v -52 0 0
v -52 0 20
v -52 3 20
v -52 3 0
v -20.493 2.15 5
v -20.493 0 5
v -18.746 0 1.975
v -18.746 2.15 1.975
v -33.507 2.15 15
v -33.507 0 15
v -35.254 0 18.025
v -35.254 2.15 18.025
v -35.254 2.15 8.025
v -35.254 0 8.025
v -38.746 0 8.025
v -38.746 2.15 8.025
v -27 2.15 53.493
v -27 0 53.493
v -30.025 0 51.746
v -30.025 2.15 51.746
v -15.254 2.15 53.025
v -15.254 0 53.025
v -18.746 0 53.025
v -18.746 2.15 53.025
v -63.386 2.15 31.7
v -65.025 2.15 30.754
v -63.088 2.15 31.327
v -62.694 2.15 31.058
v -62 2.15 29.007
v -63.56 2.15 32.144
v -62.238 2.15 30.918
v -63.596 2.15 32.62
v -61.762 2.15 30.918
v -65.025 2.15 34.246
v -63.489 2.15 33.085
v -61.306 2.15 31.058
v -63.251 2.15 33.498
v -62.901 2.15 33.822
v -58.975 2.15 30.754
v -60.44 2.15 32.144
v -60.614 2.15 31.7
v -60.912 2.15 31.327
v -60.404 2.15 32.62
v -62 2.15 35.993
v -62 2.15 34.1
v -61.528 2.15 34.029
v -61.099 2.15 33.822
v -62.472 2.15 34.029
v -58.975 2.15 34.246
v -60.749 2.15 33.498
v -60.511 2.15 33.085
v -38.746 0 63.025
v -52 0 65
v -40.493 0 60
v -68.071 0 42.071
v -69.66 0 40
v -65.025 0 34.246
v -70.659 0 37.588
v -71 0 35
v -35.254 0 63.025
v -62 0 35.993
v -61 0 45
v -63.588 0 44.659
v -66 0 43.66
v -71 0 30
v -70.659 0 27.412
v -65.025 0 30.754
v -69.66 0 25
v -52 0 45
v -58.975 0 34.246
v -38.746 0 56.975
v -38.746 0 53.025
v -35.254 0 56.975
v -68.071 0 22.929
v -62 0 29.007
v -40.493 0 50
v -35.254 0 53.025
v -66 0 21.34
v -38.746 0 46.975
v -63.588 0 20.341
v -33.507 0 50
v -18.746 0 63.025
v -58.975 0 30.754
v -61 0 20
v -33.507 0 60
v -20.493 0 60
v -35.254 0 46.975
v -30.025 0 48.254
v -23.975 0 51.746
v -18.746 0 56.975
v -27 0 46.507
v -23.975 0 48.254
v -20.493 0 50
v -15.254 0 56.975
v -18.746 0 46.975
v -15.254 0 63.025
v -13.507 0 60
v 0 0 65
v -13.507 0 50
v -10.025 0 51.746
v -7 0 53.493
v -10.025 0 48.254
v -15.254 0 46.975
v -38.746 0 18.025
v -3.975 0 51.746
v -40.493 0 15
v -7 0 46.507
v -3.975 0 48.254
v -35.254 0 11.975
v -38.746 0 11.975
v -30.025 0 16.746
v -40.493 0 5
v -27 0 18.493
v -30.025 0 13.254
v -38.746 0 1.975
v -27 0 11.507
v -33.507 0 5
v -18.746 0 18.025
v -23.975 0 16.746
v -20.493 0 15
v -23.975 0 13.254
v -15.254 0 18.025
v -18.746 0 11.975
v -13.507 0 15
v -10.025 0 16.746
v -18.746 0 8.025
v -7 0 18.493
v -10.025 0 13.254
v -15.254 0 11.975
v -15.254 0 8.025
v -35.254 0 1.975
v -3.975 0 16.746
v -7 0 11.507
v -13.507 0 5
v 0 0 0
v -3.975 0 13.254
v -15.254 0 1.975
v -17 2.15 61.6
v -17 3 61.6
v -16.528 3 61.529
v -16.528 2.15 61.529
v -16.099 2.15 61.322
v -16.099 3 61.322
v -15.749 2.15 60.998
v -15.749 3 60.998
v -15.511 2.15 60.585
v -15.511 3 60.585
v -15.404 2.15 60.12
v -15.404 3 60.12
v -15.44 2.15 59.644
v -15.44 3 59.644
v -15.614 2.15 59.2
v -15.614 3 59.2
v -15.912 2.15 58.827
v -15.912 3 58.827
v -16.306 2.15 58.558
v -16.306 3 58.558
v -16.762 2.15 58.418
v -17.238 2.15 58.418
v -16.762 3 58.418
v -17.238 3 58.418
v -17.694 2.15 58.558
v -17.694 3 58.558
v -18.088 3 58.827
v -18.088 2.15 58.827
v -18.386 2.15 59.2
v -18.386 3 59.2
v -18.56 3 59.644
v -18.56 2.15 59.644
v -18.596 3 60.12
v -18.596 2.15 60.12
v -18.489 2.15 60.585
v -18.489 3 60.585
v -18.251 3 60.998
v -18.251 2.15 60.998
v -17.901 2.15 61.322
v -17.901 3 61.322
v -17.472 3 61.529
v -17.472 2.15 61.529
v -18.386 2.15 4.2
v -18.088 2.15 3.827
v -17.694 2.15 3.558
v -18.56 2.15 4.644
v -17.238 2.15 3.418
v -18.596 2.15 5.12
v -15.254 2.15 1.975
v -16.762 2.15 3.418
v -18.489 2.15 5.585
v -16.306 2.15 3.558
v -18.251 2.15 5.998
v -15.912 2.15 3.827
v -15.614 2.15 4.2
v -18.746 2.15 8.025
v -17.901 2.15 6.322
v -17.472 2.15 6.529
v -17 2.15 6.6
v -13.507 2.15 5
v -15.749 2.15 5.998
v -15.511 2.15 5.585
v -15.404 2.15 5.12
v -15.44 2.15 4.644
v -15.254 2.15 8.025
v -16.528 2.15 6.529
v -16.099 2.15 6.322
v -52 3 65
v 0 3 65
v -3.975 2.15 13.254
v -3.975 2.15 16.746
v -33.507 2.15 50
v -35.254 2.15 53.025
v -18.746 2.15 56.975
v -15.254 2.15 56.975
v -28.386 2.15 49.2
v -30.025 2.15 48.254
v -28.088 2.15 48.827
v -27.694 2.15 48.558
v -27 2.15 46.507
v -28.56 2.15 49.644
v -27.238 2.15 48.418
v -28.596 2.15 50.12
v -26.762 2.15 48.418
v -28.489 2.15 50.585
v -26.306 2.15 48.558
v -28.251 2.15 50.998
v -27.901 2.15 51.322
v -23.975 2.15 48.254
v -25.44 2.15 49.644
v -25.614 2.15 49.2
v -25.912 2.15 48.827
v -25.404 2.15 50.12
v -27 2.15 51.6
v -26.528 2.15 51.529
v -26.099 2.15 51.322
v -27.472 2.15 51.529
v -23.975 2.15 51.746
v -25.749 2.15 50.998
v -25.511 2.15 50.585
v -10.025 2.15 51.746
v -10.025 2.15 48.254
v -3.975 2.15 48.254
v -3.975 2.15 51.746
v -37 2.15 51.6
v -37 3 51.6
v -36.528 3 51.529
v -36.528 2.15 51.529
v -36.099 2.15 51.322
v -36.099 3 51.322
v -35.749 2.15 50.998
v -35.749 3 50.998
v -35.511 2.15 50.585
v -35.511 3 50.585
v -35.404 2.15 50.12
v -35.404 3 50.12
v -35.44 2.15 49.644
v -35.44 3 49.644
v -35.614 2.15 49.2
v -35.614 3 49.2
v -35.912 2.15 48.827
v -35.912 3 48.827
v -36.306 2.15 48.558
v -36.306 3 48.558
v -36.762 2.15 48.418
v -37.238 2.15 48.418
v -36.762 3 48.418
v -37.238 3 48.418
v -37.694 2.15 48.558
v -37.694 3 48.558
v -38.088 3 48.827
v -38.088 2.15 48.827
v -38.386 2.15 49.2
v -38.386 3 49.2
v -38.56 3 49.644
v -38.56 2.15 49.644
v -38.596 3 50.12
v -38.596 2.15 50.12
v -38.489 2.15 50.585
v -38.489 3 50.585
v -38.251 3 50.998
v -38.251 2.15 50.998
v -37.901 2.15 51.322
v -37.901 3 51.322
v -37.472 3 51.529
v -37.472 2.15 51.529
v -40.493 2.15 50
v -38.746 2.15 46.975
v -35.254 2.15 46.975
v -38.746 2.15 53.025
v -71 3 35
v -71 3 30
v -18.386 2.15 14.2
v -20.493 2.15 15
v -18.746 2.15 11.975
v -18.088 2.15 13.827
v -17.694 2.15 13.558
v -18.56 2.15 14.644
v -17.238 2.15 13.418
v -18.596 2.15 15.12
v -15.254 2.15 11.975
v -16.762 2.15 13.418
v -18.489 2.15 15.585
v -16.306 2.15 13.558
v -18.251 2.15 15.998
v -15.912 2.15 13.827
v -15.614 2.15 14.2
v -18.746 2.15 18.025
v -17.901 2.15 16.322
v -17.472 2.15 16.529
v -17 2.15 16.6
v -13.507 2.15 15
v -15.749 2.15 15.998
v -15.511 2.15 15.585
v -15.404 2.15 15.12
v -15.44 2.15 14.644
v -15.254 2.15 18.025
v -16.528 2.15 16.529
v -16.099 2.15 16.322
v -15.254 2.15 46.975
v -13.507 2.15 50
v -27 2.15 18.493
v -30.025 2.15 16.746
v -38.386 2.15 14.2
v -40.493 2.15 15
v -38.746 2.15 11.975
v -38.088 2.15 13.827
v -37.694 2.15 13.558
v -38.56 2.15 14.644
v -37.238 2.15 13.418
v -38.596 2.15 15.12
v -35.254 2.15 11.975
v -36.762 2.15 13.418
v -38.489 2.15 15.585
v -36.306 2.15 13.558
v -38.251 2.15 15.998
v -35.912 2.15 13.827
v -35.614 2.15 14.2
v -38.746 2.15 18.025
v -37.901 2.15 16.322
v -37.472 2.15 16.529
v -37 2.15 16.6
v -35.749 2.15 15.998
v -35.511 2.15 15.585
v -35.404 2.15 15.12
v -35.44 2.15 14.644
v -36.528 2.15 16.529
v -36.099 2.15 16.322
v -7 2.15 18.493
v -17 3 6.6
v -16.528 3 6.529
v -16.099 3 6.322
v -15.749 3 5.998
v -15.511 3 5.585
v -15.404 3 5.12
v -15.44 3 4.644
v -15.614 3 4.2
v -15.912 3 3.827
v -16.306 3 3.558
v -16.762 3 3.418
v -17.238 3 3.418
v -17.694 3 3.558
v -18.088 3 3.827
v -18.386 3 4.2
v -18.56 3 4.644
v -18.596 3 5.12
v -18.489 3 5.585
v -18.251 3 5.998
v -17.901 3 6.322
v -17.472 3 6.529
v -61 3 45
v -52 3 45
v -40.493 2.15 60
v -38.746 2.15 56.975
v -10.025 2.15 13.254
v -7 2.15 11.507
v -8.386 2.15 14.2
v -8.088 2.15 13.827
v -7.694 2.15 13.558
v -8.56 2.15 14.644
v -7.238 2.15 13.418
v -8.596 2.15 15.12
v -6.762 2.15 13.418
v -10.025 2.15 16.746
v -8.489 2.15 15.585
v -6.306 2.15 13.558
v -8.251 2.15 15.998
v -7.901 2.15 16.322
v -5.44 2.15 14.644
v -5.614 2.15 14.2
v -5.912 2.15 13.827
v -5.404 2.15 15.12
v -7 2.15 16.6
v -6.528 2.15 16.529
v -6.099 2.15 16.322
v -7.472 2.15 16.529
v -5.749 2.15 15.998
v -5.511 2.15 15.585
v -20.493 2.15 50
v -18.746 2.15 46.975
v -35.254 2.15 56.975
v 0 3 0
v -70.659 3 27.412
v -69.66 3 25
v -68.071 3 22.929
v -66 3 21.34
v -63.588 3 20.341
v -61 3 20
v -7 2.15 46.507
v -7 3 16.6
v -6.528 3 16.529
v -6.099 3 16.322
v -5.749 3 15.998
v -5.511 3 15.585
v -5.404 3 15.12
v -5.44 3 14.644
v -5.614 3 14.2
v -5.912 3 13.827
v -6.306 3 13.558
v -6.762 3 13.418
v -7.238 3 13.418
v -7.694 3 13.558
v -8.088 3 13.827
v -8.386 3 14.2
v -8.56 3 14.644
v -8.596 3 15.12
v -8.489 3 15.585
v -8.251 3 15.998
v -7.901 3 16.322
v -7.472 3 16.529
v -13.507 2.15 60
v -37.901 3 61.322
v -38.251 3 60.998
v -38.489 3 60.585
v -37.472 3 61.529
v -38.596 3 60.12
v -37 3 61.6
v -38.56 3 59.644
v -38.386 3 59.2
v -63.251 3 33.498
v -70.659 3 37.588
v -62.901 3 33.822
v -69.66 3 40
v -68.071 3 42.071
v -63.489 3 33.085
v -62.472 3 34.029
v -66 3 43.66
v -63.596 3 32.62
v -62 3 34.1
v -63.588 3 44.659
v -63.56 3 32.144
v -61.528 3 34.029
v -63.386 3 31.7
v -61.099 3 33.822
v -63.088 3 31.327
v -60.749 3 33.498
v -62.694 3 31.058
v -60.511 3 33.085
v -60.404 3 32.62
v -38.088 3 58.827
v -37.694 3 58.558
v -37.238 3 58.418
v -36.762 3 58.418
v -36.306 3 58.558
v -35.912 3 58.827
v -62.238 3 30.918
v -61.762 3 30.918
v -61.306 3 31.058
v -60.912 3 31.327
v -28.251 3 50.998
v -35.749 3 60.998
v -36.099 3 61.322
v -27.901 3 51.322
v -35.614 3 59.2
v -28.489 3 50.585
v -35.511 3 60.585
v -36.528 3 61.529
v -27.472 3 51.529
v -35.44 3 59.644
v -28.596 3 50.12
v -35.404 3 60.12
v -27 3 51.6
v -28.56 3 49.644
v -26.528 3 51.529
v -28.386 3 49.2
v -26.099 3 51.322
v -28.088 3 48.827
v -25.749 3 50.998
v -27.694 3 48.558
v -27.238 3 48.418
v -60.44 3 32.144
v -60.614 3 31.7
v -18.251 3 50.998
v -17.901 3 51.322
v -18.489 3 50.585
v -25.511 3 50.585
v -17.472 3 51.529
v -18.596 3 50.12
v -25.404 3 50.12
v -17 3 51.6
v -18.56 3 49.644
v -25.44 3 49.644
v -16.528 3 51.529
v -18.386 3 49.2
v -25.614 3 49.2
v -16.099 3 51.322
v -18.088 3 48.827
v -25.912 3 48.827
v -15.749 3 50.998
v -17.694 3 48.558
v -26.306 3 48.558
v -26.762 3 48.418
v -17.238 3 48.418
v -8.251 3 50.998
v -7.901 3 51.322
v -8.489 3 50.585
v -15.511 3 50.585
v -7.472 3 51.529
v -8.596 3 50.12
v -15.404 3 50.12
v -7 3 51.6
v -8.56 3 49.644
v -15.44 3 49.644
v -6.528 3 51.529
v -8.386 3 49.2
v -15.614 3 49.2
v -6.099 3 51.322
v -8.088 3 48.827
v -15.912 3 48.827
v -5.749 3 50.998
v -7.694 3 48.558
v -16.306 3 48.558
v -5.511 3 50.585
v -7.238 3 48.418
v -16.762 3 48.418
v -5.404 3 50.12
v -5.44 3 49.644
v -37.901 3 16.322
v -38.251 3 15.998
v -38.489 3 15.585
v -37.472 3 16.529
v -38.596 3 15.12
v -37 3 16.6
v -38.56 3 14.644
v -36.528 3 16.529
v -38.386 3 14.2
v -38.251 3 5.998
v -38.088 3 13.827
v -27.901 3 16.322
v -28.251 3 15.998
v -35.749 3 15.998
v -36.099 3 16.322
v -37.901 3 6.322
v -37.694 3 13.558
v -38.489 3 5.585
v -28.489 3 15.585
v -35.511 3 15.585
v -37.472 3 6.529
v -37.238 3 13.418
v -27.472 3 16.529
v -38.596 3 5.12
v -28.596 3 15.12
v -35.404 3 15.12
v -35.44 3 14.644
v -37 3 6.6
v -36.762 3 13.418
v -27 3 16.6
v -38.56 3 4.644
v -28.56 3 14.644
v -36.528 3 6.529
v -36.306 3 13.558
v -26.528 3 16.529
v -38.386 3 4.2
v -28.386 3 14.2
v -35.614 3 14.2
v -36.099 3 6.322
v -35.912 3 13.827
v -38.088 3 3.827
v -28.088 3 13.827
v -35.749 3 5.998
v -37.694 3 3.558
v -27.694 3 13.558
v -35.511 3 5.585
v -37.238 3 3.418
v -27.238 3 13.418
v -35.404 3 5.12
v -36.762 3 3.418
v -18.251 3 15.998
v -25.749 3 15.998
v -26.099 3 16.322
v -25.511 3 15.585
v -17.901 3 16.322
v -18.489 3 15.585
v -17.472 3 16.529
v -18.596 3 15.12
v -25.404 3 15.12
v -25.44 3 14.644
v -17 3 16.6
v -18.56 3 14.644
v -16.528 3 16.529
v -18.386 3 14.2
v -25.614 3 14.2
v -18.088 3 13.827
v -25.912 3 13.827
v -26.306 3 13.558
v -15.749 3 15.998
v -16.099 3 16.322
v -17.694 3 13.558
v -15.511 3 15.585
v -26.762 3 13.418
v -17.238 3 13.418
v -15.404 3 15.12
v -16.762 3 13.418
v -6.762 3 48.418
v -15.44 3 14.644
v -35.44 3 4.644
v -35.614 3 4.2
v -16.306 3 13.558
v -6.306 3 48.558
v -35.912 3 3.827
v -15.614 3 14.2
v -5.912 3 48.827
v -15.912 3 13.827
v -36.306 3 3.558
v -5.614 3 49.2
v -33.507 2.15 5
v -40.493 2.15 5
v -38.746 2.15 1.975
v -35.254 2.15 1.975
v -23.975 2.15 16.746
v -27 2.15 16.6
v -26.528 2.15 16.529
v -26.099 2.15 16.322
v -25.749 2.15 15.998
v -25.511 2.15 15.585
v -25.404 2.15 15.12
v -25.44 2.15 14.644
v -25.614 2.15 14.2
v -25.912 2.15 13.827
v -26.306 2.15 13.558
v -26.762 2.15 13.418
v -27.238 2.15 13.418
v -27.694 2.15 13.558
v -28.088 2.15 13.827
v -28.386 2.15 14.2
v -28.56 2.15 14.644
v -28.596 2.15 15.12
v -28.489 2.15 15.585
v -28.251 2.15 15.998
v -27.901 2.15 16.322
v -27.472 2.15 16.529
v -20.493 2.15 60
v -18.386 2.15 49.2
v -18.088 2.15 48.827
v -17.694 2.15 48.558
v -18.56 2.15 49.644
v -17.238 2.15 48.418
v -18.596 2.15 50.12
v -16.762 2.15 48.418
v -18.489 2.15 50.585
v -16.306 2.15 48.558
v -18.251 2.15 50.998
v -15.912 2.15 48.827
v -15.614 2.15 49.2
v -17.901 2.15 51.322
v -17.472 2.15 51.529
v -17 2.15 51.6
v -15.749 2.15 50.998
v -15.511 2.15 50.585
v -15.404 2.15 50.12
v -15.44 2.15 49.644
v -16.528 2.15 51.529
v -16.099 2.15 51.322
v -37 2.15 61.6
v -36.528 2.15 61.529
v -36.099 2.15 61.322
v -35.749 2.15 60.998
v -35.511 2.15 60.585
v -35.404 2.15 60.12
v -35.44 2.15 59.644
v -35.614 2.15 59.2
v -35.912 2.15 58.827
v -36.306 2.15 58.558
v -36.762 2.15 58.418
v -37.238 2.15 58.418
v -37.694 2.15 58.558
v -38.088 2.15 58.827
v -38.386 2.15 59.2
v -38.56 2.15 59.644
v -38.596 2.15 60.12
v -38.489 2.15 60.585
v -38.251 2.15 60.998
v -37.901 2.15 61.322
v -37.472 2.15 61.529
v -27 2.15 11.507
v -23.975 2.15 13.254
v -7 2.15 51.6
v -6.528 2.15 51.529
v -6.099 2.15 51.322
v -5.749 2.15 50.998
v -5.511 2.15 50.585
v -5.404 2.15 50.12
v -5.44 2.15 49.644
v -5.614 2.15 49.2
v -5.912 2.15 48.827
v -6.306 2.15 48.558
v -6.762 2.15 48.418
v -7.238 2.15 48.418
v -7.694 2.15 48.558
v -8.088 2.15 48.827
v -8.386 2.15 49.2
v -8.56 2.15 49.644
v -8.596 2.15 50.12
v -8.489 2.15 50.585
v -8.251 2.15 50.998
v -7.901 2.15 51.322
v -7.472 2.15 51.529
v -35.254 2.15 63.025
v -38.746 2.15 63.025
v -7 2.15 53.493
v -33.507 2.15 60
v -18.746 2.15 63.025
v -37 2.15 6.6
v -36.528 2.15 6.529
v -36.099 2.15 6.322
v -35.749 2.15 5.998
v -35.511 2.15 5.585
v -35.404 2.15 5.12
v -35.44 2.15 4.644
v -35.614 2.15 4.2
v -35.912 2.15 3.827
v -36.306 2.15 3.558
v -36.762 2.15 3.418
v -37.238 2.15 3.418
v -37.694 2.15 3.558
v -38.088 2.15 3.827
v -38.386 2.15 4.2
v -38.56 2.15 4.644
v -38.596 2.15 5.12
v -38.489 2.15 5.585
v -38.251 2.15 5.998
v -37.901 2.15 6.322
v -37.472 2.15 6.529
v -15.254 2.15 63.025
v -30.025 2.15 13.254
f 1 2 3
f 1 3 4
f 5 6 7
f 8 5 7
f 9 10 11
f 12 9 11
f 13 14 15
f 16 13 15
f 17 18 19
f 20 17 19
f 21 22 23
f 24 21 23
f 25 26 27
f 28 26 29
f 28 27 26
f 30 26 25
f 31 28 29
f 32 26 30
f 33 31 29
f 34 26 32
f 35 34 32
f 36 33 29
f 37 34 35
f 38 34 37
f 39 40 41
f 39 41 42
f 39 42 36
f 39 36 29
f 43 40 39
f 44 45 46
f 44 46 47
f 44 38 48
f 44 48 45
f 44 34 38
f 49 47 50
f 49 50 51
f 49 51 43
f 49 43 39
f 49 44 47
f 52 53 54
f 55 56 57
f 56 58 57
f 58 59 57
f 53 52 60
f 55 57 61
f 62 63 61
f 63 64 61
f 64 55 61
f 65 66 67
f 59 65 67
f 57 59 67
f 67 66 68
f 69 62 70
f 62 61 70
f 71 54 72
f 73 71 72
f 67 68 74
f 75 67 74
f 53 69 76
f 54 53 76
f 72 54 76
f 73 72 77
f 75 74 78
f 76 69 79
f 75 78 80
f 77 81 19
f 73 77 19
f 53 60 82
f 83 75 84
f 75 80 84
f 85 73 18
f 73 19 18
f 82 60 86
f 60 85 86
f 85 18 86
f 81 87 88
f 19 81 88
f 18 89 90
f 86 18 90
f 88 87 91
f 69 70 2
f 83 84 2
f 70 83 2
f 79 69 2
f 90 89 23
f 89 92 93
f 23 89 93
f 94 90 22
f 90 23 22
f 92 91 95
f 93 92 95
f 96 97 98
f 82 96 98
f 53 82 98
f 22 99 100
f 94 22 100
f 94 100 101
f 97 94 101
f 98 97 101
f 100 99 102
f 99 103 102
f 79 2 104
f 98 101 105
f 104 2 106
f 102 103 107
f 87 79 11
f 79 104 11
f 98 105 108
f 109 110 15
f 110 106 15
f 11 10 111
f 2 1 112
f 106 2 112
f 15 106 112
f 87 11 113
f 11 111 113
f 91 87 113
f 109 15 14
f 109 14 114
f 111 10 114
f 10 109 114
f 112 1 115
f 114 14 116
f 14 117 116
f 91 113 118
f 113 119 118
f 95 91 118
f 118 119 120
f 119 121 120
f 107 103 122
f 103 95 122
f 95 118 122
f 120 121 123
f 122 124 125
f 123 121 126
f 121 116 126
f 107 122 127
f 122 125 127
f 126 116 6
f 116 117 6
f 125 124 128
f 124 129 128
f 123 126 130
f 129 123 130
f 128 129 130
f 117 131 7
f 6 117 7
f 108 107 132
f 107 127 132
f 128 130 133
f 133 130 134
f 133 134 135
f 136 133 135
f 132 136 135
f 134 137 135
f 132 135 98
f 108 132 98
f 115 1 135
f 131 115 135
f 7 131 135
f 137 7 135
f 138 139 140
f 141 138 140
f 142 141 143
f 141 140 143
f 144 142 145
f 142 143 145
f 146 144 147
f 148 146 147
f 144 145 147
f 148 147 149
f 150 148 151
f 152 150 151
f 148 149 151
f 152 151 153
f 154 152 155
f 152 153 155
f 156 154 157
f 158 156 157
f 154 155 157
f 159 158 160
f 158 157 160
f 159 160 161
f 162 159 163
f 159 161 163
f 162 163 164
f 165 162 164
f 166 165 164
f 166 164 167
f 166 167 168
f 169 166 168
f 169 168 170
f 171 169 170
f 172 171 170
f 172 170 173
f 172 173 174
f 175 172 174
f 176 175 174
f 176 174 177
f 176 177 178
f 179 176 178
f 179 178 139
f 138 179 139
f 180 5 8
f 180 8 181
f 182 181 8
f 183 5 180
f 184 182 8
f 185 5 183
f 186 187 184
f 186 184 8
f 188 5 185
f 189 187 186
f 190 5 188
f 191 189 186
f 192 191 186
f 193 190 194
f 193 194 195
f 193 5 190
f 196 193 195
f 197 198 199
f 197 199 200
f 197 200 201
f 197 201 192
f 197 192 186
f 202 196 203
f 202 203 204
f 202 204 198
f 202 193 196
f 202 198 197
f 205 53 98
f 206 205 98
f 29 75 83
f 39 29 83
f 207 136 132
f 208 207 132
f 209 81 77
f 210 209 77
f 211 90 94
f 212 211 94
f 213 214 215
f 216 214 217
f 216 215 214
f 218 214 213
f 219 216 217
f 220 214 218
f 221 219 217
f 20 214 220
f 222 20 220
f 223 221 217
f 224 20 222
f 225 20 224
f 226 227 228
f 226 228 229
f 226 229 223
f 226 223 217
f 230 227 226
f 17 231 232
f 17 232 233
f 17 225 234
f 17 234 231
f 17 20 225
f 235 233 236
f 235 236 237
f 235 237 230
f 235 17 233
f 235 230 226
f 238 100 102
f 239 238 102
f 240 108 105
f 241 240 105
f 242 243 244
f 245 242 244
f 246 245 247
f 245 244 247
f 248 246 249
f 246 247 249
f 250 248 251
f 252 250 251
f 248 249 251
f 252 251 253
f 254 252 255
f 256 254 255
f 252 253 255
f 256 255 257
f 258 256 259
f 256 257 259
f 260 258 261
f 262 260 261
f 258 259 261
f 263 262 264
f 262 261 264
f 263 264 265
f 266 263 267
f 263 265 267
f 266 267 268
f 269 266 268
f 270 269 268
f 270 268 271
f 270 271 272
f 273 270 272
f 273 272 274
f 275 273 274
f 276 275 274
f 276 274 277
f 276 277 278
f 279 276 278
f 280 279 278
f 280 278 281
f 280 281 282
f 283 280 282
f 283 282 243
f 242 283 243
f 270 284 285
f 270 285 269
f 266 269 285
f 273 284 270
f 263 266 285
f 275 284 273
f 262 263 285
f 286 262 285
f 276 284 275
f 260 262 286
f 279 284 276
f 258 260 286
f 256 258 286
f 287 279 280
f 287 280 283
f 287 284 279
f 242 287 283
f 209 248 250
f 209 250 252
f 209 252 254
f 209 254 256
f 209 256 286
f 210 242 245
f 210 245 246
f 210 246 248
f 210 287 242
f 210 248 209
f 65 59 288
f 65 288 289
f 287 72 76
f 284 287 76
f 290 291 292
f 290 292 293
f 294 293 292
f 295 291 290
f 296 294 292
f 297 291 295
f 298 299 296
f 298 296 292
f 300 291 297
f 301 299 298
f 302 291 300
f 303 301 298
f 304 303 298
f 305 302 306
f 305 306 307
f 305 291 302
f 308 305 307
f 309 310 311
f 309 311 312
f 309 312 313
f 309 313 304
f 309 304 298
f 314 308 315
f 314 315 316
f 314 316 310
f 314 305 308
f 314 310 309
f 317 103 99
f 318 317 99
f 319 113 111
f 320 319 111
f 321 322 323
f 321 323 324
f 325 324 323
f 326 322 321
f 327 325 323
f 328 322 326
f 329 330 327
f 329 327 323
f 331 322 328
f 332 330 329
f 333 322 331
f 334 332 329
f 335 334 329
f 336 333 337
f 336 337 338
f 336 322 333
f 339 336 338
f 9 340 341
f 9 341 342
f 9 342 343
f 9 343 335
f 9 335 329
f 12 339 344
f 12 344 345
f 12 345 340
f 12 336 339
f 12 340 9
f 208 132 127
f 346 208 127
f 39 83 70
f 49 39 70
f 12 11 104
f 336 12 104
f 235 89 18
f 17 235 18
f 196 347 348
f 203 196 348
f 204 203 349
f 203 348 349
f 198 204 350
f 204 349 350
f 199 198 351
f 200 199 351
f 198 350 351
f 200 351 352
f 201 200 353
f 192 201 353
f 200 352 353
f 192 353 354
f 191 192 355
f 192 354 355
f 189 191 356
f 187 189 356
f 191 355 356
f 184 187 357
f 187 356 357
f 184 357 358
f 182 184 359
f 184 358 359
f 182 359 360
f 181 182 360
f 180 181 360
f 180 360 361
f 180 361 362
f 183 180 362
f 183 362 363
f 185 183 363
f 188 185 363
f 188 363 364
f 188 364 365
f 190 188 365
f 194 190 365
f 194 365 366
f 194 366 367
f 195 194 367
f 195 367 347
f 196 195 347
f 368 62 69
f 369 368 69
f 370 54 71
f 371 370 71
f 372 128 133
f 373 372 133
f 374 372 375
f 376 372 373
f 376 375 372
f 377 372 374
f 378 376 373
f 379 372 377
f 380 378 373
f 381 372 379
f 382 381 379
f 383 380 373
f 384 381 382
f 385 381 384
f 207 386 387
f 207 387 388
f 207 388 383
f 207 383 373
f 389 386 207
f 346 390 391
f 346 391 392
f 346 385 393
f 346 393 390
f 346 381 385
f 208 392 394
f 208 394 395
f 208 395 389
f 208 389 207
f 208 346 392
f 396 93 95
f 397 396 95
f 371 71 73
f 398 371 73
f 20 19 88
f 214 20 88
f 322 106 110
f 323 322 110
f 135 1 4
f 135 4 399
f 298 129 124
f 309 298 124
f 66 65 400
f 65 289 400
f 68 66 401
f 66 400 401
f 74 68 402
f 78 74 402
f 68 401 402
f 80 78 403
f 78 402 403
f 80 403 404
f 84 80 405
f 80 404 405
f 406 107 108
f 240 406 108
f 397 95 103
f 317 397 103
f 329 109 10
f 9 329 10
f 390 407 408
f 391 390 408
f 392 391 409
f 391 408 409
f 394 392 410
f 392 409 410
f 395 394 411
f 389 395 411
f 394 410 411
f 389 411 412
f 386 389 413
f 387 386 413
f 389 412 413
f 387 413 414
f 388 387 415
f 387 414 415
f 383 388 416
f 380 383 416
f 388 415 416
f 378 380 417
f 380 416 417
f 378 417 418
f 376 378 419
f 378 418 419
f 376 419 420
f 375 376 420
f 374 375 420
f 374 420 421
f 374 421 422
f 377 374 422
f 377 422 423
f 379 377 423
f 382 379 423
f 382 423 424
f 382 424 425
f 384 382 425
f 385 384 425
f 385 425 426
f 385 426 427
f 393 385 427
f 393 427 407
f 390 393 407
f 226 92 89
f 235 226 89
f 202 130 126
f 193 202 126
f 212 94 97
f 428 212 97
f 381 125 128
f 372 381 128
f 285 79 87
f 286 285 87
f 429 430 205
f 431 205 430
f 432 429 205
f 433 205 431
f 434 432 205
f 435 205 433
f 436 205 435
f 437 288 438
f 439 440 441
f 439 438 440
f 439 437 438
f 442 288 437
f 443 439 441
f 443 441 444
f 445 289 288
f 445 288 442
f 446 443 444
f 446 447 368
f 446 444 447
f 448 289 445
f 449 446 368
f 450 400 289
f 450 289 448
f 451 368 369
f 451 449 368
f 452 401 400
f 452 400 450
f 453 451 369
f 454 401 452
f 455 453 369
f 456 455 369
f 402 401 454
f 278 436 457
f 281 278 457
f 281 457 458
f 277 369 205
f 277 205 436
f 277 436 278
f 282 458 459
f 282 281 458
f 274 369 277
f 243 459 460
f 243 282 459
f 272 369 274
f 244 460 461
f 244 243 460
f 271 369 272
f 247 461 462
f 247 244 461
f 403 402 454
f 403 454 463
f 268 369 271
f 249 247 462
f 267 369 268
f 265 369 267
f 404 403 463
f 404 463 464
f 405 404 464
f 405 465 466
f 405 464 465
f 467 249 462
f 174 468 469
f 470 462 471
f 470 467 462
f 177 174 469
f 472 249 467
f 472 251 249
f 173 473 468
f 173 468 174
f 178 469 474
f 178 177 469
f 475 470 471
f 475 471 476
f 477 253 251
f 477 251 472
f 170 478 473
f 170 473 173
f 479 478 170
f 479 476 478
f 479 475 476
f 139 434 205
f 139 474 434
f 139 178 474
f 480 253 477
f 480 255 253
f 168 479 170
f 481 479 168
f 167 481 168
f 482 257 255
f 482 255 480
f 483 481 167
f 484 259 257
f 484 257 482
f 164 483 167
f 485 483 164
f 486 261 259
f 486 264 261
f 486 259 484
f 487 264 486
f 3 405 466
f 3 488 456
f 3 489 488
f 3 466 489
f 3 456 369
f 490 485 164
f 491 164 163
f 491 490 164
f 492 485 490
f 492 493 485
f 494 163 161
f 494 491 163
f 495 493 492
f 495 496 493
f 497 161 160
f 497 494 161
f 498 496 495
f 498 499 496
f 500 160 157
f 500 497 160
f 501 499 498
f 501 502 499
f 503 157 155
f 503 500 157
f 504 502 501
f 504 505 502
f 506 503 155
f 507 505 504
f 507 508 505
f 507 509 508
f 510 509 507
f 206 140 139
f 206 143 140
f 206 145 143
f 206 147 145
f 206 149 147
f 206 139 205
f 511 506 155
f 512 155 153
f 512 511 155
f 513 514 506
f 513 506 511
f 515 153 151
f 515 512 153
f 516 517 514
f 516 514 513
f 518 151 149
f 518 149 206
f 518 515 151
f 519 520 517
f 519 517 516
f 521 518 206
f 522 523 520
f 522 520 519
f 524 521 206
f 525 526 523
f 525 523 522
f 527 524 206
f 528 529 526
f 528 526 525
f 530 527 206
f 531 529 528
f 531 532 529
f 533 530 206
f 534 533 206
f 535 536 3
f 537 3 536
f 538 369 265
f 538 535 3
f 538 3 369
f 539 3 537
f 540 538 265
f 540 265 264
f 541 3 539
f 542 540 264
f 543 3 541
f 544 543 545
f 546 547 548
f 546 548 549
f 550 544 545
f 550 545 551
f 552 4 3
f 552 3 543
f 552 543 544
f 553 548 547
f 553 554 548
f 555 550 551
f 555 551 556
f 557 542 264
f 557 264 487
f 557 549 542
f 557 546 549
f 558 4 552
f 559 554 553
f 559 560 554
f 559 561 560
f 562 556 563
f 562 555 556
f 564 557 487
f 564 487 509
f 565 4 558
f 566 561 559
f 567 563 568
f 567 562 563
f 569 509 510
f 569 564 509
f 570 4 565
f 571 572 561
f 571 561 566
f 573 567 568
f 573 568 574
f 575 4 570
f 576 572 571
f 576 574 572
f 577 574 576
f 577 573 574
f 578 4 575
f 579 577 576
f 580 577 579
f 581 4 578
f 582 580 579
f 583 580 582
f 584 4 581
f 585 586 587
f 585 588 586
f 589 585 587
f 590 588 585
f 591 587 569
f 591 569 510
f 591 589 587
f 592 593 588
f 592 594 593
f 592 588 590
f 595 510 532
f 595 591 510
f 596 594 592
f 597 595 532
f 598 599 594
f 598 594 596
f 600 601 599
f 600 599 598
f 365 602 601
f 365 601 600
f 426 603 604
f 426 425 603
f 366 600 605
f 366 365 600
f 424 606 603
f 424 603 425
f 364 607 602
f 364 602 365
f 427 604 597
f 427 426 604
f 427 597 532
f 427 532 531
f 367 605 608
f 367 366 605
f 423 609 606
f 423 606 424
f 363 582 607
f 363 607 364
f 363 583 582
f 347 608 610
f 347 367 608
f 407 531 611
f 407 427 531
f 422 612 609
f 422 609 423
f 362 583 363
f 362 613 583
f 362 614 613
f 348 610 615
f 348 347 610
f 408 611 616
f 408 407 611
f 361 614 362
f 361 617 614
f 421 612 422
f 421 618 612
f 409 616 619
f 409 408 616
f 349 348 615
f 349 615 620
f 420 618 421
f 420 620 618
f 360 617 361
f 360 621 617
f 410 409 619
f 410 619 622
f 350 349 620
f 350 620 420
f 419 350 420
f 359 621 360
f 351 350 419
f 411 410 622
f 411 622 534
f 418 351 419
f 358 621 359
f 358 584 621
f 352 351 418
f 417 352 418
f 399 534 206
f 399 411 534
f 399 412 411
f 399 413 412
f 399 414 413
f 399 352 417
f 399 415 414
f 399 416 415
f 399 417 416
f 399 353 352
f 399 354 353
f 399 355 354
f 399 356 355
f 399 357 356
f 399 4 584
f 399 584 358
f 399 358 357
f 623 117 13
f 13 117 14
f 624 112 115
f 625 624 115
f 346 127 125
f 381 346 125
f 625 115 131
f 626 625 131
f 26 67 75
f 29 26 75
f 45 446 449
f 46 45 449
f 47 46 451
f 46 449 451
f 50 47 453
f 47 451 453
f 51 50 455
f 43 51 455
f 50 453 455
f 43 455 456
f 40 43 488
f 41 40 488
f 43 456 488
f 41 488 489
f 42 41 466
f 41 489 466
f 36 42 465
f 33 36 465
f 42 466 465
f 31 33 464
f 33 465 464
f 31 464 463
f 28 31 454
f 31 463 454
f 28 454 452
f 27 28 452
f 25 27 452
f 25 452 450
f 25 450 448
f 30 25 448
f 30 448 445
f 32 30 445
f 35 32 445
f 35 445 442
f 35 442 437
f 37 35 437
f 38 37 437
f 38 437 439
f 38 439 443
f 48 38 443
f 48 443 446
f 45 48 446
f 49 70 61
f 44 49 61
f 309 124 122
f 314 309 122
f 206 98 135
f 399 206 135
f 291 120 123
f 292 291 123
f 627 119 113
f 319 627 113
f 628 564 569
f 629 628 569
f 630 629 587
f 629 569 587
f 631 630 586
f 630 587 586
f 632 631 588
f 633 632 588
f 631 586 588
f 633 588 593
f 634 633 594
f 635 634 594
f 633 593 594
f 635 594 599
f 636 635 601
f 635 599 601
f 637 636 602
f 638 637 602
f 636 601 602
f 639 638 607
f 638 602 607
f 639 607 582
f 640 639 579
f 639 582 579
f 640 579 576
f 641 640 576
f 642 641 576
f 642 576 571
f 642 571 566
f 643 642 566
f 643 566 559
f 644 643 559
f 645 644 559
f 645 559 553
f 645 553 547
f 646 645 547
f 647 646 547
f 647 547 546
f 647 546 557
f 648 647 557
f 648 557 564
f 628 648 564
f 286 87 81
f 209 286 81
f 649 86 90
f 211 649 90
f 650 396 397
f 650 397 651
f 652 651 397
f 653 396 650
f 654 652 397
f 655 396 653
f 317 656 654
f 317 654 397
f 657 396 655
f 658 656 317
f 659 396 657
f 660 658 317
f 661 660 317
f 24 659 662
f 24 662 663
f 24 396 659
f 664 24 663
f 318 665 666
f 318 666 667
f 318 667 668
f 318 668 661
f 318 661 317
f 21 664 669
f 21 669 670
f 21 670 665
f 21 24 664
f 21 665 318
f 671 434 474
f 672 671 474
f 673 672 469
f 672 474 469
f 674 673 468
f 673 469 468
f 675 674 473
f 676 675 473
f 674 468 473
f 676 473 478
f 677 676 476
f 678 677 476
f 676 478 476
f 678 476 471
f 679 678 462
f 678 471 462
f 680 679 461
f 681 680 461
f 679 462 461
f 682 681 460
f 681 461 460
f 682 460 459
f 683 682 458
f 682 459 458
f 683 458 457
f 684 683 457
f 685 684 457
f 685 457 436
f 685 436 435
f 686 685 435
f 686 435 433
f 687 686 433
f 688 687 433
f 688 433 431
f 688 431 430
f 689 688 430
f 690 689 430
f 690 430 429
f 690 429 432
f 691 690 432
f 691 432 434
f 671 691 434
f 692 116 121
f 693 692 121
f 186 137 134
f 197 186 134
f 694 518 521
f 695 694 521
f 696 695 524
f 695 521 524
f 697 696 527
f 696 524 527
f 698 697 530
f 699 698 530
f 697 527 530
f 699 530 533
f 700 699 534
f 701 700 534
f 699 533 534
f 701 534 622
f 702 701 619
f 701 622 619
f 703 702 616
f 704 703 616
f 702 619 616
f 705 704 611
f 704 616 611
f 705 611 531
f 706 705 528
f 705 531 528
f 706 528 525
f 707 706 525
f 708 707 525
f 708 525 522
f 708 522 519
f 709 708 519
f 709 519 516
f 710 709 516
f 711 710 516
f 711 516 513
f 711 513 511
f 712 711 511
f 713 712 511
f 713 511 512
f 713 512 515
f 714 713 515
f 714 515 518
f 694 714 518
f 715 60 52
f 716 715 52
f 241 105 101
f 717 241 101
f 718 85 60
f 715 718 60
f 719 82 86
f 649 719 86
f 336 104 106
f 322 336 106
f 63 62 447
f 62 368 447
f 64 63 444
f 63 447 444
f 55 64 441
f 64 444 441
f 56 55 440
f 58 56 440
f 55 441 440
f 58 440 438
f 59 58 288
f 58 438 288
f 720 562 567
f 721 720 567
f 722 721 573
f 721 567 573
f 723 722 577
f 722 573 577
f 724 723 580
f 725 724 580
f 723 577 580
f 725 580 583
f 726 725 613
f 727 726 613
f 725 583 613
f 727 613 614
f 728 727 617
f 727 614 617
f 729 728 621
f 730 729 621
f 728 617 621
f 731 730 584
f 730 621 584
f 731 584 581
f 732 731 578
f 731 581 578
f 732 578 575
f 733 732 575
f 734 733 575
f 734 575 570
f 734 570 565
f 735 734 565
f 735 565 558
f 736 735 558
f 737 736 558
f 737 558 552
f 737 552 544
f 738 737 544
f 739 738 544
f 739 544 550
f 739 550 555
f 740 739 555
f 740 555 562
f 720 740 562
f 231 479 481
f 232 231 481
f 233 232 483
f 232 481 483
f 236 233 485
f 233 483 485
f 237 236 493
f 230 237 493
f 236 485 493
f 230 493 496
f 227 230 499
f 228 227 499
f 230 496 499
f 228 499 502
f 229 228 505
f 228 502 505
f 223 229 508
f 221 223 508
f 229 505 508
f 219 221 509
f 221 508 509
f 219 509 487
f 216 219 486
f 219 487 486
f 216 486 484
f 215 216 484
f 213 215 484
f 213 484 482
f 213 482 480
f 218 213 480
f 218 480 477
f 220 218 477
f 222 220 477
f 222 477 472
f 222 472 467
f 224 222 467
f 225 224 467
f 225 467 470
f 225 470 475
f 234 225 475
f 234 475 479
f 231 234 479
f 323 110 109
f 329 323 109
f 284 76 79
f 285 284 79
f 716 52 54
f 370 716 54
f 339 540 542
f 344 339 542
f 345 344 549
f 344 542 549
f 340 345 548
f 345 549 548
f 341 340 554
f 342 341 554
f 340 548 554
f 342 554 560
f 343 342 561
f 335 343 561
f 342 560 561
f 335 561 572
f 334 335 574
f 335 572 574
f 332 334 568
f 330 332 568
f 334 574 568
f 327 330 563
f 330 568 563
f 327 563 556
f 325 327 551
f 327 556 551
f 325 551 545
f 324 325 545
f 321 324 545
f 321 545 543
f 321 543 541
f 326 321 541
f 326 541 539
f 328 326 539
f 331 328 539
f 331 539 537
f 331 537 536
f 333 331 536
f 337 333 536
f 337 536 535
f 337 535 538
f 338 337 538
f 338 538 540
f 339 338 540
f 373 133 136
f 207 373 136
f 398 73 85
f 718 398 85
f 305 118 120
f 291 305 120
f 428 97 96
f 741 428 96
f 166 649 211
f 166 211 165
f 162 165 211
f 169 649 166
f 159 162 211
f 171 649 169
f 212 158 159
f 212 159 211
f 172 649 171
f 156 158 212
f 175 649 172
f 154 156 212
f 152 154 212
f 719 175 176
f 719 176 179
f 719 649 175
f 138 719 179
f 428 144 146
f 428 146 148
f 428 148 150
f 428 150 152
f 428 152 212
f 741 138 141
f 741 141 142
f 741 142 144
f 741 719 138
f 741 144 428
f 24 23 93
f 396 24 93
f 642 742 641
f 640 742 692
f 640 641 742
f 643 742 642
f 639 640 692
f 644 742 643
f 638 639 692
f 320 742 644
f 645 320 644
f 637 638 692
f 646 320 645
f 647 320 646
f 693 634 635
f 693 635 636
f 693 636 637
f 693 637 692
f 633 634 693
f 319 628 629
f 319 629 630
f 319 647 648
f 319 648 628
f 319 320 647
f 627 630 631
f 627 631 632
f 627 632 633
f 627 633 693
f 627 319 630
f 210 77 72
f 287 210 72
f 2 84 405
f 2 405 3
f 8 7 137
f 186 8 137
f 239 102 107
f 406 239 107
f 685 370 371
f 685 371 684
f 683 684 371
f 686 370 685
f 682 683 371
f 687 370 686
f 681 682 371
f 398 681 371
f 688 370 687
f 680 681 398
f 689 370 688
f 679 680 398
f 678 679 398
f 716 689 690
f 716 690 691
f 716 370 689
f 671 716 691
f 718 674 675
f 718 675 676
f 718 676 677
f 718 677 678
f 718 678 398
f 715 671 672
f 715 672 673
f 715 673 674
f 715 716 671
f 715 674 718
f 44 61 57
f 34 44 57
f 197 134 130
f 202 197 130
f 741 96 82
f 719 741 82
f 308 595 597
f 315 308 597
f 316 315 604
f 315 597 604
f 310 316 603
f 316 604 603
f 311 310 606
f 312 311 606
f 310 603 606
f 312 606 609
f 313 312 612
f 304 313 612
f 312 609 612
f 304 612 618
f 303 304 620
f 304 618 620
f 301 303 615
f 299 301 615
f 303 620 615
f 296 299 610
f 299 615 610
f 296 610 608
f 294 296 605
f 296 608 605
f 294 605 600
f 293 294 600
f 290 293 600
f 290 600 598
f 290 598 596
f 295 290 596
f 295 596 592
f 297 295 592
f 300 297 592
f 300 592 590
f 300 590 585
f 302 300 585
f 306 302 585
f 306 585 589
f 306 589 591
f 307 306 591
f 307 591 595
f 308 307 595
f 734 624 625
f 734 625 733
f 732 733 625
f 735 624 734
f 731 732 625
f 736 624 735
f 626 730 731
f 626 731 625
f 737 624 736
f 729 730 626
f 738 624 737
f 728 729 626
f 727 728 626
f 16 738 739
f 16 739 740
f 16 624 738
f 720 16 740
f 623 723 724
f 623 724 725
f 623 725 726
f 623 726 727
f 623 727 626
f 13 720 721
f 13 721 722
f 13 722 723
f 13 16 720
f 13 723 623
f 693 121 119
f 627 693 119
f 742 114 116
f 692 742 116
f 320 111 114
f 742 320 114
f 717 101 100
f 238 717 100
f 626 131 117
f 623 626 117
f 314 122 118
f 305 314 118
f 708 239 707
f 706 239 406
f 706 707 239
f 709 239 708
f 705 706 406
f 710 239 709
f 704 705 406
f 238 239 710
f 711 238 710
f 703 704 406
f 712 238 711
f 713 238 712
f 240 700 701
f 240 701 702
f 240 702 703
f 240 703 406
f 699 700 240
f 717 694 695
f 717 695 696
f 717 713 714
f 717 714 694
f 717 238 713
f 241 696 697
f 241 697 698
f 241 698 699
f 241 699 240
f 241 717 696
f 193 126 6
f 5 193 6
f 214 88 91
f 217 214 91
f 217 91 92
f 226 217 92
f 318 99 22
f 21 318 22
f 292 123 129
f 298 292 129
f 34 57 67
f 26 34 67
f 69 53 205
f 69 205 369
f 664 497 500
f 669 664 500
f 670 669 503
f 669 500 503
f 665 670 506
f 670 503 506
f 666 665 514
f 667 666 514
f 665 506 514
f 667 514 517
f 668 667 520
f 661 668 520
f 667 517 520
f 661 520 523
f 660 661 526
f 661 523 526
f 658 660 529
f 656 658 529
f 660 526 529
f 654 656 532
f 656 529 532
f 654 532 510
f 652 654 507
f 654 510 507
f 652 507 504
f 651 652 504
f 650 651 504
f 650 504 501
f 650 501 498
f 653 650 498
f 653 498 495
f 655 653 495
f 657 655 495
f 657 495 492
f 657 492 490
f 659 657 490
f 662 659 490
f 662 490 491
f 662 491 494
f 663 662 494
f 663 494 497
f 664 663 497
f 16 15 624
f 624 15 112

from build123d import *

# Parameters (mm, degrees)
BOSS_EXTRUDE1_DEPTH = 3
CUT_EXTRUDE1_DEPTH  = 2.15
HOLE1_D             = 3.2
FILLET1_R           = 10


with BuildPart() as part:
    # Sketch1 → Boss-Extrude1 (new body)
    with BuildSketch(Plane(origin=(0, 0, 0), x_dir=(1, 0, 0), z_dir=(0, 1, 0))):
        Polygon((0, 0), (-52, 0), (-52, -20), (-71, -20), (-71, -45), (-52, -45), (-52, -65), (0, -65), align=None)
    extrude(amount=BOSS_EXTRUDE1_DEPTH)

    # Sketch2 → Cut-Extrude1 (cut)
    with BuildSketch(Plane.XZ):
        Polygon((-7, 46.507030871), (-3.975, 48.253515436), (-3.975, 51.746484564), (-7, 53.492969129), (-10.025, 51.746484564), (-10.025, 48.253515436), align=None)
        Polygon((-35.253515436, 56.975), (-33.507030871, 60), (-35.253515436, 63.025), (-38.746484564, 63.025), (-40.492969129, 60), (-38.746484564, 56.975), align=None)
        Polygon((-20.492969129, 60), (-18.746484564, 56.975), (-15.253515436, 56.975), (-13.507030871, 60), (-15.253515436, 63.025), (-18.746484564, 63.025), align=None)
        Polygon((-18.746484564, 46.975), (-15.253515436, 46.975), (-13.507030871, 50), (-15.253515436, 53.025), (-18.746484564, 53.025), (-20.492969129, 50), align=None)
        Polygon((-38.746484564, 46.975), (-35.253515436, 46.975), (-33.507030871, 50), (-35.253515436, 53.025), (-38.746484564, 53.025), (-40.492969129, 50), align=None)
        Polygon((-38.746484564, 11.975), (-35.253515436, 11.975), (-33.507030871, 15), (-35.253515436, 18.025), (-38.746484564, 18.025), (-40.492969129, 15), align=None)
        Polygon((-18.746484564, 11.975), (-15.253515436, 11.975), (-13.507030871, 15), (-15.253515436, 18.025), (-18.746484564, 18.025), (-20.492969129, 15), align=None)
        Polygon((-15.253515436, 1.975), (-13.507030871, 5), (-15.253515436, 8.025), (-18.746484564, 8.025), (-20.492969129, 5), (-18.746484564, 1.975), align=None)
        Polygon((-35.253515436, 8.025), (-38.746484564, 8.025), (-40.492969129, 5), (-38.746484564, 1.975), (-35.253515436, 1.975), (-33.507030871, 5), align=None)
        Polygon((-27, 46.507030871), (-23.975, 48.253515436), (-23.975, 51.746484564), (-27, 53.492969129), (-30.025, 51.746484564), (-30.025, 48.253515436), align=None)
        Polygon((-23.975, 13.253515436), (-23.975, 16.746484564), (-27, 18.492969129), (-30.025, 16.746484564), (-30.025, 13.253515436), (-27, 11.507030871), align=None)
        Polygon((-58.975, 30.753515436), (-58.975, 34.246484564), (-62, 35.992969129), (-65.025, 34.246484564), (-65.025, 30.753515436), (-62, 29.007030871), align=None)
        Polygon((-3.975, 16.746484564), (-7, 18.492969129), (-10.025, 16.746484564), (-10.025, 13.253515436), (-7, 11.507030871), (-3.975, 13.253515436), align=None)
    extrude(amount=-CUT_EXTRUDE1_DEPTH, mode=Mode.SUBTRACT)

    # Hole1 (through all)
    with Locations(Plane(origin=(-37, 0, 5), x_dir=(0, 0, -1), z_dir=(0, -1, 0))):
        with Locations((0, 0), (-10, 0), (-10, 20), (0, 20), (-10, 10), (-45, 10), (-45, 20), (-55, 20), (-55, 0), (-45, 0), (-27.5, -25), (-10, 30), (-45, 30)):
            Hole(HOLE1_D / 2)

    # Fillet1
    fillet1_edges = [part.edges().sort_by_distance(p)[0] for p in [
        (-71, 1.5, 20),
        (-71, 1.5, 45),
    ]]
    fillet(fillet1_edges, radius=FILLET1_R)


solid = part.part
